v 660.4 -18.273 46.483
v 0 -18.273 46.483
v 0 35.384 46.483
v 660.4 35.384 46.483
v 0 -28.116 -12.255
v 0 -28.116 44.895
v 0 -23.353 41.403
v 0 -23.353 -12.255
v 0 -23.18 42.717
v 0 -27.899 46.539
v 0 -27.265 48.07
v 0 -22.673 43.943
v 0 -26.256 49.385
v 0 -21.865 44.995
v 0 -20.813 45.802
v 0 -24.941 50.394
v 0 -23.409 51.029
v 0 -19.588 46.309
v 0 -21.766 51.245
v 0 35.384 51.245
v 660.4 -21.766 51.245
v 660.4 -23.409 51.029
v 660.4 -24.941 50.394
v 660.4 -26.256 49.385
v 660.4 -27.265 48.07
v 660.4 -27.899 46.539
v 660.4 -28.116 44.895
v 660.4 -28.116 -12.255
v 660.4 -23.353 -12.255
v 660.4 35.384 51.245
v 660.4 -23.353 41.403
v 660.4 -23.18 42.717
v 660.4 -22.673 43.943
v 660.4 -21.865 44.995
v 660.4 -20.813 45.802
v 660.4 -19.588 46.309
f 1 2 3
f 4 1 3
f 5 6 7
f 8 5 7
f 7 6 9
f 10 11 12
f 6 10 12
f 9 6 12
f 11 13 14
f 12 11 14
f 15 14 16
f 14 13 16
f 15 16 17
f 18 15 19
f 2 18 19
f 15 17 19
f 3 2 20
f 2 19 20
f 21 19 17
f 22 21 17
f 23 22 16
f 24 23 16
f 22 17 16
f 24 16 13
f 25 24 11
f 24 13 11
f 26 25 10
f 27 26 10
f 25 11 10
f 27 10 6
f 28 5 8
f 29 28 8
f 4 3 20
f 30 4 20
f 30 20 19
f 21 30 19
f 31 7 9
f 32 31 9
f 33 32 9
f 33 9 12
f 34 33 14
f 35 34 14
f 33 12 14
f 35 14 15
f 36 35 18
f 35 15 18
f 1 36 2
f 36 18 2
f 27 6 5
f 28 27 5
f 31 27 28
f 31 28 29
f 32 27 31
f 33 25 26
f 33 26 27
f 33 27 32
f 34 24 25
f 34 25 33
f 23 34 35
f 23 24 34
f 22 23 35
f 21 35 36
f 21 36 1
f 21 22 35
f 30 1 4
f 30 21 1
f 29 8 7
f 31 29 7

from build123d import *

# Parameters (mm, degrees)
F1_DEPTH = 660.4


with BuildPart() as f1:
    # F0 (on Right) → F1 (new body)
    with BuildSketch(Plane.YZ):
        with BuildLine():
            Line((-28.115756, 44.895094), (-28.115756, -12.254906))
            Line((-28.115756, -12.254906), (-23.353256, -12.254906))
            Line((-23.353256, -12.254906), (-23.353256, 41.402594))
            ThreePointArc((-23.353256, 41.402594), (-21.865359, 44.994697), (-18.273256, 46.482594))
            Line((-18.273256, 46.482594), (35.384244, 46.482594))
            Line((35.384244, 46.482594), (35.384244, 51.245094))
            Line((35.384244, 51.245094), (-21.765756, 51.245094))
            ThreePointArc((-21.765756, 51.245094), (-26.255884, 49.385222), (-28.115756, 44.895094))
        make_face()
    extrude(amount=F1_DEPTH)


solid = f1.part
